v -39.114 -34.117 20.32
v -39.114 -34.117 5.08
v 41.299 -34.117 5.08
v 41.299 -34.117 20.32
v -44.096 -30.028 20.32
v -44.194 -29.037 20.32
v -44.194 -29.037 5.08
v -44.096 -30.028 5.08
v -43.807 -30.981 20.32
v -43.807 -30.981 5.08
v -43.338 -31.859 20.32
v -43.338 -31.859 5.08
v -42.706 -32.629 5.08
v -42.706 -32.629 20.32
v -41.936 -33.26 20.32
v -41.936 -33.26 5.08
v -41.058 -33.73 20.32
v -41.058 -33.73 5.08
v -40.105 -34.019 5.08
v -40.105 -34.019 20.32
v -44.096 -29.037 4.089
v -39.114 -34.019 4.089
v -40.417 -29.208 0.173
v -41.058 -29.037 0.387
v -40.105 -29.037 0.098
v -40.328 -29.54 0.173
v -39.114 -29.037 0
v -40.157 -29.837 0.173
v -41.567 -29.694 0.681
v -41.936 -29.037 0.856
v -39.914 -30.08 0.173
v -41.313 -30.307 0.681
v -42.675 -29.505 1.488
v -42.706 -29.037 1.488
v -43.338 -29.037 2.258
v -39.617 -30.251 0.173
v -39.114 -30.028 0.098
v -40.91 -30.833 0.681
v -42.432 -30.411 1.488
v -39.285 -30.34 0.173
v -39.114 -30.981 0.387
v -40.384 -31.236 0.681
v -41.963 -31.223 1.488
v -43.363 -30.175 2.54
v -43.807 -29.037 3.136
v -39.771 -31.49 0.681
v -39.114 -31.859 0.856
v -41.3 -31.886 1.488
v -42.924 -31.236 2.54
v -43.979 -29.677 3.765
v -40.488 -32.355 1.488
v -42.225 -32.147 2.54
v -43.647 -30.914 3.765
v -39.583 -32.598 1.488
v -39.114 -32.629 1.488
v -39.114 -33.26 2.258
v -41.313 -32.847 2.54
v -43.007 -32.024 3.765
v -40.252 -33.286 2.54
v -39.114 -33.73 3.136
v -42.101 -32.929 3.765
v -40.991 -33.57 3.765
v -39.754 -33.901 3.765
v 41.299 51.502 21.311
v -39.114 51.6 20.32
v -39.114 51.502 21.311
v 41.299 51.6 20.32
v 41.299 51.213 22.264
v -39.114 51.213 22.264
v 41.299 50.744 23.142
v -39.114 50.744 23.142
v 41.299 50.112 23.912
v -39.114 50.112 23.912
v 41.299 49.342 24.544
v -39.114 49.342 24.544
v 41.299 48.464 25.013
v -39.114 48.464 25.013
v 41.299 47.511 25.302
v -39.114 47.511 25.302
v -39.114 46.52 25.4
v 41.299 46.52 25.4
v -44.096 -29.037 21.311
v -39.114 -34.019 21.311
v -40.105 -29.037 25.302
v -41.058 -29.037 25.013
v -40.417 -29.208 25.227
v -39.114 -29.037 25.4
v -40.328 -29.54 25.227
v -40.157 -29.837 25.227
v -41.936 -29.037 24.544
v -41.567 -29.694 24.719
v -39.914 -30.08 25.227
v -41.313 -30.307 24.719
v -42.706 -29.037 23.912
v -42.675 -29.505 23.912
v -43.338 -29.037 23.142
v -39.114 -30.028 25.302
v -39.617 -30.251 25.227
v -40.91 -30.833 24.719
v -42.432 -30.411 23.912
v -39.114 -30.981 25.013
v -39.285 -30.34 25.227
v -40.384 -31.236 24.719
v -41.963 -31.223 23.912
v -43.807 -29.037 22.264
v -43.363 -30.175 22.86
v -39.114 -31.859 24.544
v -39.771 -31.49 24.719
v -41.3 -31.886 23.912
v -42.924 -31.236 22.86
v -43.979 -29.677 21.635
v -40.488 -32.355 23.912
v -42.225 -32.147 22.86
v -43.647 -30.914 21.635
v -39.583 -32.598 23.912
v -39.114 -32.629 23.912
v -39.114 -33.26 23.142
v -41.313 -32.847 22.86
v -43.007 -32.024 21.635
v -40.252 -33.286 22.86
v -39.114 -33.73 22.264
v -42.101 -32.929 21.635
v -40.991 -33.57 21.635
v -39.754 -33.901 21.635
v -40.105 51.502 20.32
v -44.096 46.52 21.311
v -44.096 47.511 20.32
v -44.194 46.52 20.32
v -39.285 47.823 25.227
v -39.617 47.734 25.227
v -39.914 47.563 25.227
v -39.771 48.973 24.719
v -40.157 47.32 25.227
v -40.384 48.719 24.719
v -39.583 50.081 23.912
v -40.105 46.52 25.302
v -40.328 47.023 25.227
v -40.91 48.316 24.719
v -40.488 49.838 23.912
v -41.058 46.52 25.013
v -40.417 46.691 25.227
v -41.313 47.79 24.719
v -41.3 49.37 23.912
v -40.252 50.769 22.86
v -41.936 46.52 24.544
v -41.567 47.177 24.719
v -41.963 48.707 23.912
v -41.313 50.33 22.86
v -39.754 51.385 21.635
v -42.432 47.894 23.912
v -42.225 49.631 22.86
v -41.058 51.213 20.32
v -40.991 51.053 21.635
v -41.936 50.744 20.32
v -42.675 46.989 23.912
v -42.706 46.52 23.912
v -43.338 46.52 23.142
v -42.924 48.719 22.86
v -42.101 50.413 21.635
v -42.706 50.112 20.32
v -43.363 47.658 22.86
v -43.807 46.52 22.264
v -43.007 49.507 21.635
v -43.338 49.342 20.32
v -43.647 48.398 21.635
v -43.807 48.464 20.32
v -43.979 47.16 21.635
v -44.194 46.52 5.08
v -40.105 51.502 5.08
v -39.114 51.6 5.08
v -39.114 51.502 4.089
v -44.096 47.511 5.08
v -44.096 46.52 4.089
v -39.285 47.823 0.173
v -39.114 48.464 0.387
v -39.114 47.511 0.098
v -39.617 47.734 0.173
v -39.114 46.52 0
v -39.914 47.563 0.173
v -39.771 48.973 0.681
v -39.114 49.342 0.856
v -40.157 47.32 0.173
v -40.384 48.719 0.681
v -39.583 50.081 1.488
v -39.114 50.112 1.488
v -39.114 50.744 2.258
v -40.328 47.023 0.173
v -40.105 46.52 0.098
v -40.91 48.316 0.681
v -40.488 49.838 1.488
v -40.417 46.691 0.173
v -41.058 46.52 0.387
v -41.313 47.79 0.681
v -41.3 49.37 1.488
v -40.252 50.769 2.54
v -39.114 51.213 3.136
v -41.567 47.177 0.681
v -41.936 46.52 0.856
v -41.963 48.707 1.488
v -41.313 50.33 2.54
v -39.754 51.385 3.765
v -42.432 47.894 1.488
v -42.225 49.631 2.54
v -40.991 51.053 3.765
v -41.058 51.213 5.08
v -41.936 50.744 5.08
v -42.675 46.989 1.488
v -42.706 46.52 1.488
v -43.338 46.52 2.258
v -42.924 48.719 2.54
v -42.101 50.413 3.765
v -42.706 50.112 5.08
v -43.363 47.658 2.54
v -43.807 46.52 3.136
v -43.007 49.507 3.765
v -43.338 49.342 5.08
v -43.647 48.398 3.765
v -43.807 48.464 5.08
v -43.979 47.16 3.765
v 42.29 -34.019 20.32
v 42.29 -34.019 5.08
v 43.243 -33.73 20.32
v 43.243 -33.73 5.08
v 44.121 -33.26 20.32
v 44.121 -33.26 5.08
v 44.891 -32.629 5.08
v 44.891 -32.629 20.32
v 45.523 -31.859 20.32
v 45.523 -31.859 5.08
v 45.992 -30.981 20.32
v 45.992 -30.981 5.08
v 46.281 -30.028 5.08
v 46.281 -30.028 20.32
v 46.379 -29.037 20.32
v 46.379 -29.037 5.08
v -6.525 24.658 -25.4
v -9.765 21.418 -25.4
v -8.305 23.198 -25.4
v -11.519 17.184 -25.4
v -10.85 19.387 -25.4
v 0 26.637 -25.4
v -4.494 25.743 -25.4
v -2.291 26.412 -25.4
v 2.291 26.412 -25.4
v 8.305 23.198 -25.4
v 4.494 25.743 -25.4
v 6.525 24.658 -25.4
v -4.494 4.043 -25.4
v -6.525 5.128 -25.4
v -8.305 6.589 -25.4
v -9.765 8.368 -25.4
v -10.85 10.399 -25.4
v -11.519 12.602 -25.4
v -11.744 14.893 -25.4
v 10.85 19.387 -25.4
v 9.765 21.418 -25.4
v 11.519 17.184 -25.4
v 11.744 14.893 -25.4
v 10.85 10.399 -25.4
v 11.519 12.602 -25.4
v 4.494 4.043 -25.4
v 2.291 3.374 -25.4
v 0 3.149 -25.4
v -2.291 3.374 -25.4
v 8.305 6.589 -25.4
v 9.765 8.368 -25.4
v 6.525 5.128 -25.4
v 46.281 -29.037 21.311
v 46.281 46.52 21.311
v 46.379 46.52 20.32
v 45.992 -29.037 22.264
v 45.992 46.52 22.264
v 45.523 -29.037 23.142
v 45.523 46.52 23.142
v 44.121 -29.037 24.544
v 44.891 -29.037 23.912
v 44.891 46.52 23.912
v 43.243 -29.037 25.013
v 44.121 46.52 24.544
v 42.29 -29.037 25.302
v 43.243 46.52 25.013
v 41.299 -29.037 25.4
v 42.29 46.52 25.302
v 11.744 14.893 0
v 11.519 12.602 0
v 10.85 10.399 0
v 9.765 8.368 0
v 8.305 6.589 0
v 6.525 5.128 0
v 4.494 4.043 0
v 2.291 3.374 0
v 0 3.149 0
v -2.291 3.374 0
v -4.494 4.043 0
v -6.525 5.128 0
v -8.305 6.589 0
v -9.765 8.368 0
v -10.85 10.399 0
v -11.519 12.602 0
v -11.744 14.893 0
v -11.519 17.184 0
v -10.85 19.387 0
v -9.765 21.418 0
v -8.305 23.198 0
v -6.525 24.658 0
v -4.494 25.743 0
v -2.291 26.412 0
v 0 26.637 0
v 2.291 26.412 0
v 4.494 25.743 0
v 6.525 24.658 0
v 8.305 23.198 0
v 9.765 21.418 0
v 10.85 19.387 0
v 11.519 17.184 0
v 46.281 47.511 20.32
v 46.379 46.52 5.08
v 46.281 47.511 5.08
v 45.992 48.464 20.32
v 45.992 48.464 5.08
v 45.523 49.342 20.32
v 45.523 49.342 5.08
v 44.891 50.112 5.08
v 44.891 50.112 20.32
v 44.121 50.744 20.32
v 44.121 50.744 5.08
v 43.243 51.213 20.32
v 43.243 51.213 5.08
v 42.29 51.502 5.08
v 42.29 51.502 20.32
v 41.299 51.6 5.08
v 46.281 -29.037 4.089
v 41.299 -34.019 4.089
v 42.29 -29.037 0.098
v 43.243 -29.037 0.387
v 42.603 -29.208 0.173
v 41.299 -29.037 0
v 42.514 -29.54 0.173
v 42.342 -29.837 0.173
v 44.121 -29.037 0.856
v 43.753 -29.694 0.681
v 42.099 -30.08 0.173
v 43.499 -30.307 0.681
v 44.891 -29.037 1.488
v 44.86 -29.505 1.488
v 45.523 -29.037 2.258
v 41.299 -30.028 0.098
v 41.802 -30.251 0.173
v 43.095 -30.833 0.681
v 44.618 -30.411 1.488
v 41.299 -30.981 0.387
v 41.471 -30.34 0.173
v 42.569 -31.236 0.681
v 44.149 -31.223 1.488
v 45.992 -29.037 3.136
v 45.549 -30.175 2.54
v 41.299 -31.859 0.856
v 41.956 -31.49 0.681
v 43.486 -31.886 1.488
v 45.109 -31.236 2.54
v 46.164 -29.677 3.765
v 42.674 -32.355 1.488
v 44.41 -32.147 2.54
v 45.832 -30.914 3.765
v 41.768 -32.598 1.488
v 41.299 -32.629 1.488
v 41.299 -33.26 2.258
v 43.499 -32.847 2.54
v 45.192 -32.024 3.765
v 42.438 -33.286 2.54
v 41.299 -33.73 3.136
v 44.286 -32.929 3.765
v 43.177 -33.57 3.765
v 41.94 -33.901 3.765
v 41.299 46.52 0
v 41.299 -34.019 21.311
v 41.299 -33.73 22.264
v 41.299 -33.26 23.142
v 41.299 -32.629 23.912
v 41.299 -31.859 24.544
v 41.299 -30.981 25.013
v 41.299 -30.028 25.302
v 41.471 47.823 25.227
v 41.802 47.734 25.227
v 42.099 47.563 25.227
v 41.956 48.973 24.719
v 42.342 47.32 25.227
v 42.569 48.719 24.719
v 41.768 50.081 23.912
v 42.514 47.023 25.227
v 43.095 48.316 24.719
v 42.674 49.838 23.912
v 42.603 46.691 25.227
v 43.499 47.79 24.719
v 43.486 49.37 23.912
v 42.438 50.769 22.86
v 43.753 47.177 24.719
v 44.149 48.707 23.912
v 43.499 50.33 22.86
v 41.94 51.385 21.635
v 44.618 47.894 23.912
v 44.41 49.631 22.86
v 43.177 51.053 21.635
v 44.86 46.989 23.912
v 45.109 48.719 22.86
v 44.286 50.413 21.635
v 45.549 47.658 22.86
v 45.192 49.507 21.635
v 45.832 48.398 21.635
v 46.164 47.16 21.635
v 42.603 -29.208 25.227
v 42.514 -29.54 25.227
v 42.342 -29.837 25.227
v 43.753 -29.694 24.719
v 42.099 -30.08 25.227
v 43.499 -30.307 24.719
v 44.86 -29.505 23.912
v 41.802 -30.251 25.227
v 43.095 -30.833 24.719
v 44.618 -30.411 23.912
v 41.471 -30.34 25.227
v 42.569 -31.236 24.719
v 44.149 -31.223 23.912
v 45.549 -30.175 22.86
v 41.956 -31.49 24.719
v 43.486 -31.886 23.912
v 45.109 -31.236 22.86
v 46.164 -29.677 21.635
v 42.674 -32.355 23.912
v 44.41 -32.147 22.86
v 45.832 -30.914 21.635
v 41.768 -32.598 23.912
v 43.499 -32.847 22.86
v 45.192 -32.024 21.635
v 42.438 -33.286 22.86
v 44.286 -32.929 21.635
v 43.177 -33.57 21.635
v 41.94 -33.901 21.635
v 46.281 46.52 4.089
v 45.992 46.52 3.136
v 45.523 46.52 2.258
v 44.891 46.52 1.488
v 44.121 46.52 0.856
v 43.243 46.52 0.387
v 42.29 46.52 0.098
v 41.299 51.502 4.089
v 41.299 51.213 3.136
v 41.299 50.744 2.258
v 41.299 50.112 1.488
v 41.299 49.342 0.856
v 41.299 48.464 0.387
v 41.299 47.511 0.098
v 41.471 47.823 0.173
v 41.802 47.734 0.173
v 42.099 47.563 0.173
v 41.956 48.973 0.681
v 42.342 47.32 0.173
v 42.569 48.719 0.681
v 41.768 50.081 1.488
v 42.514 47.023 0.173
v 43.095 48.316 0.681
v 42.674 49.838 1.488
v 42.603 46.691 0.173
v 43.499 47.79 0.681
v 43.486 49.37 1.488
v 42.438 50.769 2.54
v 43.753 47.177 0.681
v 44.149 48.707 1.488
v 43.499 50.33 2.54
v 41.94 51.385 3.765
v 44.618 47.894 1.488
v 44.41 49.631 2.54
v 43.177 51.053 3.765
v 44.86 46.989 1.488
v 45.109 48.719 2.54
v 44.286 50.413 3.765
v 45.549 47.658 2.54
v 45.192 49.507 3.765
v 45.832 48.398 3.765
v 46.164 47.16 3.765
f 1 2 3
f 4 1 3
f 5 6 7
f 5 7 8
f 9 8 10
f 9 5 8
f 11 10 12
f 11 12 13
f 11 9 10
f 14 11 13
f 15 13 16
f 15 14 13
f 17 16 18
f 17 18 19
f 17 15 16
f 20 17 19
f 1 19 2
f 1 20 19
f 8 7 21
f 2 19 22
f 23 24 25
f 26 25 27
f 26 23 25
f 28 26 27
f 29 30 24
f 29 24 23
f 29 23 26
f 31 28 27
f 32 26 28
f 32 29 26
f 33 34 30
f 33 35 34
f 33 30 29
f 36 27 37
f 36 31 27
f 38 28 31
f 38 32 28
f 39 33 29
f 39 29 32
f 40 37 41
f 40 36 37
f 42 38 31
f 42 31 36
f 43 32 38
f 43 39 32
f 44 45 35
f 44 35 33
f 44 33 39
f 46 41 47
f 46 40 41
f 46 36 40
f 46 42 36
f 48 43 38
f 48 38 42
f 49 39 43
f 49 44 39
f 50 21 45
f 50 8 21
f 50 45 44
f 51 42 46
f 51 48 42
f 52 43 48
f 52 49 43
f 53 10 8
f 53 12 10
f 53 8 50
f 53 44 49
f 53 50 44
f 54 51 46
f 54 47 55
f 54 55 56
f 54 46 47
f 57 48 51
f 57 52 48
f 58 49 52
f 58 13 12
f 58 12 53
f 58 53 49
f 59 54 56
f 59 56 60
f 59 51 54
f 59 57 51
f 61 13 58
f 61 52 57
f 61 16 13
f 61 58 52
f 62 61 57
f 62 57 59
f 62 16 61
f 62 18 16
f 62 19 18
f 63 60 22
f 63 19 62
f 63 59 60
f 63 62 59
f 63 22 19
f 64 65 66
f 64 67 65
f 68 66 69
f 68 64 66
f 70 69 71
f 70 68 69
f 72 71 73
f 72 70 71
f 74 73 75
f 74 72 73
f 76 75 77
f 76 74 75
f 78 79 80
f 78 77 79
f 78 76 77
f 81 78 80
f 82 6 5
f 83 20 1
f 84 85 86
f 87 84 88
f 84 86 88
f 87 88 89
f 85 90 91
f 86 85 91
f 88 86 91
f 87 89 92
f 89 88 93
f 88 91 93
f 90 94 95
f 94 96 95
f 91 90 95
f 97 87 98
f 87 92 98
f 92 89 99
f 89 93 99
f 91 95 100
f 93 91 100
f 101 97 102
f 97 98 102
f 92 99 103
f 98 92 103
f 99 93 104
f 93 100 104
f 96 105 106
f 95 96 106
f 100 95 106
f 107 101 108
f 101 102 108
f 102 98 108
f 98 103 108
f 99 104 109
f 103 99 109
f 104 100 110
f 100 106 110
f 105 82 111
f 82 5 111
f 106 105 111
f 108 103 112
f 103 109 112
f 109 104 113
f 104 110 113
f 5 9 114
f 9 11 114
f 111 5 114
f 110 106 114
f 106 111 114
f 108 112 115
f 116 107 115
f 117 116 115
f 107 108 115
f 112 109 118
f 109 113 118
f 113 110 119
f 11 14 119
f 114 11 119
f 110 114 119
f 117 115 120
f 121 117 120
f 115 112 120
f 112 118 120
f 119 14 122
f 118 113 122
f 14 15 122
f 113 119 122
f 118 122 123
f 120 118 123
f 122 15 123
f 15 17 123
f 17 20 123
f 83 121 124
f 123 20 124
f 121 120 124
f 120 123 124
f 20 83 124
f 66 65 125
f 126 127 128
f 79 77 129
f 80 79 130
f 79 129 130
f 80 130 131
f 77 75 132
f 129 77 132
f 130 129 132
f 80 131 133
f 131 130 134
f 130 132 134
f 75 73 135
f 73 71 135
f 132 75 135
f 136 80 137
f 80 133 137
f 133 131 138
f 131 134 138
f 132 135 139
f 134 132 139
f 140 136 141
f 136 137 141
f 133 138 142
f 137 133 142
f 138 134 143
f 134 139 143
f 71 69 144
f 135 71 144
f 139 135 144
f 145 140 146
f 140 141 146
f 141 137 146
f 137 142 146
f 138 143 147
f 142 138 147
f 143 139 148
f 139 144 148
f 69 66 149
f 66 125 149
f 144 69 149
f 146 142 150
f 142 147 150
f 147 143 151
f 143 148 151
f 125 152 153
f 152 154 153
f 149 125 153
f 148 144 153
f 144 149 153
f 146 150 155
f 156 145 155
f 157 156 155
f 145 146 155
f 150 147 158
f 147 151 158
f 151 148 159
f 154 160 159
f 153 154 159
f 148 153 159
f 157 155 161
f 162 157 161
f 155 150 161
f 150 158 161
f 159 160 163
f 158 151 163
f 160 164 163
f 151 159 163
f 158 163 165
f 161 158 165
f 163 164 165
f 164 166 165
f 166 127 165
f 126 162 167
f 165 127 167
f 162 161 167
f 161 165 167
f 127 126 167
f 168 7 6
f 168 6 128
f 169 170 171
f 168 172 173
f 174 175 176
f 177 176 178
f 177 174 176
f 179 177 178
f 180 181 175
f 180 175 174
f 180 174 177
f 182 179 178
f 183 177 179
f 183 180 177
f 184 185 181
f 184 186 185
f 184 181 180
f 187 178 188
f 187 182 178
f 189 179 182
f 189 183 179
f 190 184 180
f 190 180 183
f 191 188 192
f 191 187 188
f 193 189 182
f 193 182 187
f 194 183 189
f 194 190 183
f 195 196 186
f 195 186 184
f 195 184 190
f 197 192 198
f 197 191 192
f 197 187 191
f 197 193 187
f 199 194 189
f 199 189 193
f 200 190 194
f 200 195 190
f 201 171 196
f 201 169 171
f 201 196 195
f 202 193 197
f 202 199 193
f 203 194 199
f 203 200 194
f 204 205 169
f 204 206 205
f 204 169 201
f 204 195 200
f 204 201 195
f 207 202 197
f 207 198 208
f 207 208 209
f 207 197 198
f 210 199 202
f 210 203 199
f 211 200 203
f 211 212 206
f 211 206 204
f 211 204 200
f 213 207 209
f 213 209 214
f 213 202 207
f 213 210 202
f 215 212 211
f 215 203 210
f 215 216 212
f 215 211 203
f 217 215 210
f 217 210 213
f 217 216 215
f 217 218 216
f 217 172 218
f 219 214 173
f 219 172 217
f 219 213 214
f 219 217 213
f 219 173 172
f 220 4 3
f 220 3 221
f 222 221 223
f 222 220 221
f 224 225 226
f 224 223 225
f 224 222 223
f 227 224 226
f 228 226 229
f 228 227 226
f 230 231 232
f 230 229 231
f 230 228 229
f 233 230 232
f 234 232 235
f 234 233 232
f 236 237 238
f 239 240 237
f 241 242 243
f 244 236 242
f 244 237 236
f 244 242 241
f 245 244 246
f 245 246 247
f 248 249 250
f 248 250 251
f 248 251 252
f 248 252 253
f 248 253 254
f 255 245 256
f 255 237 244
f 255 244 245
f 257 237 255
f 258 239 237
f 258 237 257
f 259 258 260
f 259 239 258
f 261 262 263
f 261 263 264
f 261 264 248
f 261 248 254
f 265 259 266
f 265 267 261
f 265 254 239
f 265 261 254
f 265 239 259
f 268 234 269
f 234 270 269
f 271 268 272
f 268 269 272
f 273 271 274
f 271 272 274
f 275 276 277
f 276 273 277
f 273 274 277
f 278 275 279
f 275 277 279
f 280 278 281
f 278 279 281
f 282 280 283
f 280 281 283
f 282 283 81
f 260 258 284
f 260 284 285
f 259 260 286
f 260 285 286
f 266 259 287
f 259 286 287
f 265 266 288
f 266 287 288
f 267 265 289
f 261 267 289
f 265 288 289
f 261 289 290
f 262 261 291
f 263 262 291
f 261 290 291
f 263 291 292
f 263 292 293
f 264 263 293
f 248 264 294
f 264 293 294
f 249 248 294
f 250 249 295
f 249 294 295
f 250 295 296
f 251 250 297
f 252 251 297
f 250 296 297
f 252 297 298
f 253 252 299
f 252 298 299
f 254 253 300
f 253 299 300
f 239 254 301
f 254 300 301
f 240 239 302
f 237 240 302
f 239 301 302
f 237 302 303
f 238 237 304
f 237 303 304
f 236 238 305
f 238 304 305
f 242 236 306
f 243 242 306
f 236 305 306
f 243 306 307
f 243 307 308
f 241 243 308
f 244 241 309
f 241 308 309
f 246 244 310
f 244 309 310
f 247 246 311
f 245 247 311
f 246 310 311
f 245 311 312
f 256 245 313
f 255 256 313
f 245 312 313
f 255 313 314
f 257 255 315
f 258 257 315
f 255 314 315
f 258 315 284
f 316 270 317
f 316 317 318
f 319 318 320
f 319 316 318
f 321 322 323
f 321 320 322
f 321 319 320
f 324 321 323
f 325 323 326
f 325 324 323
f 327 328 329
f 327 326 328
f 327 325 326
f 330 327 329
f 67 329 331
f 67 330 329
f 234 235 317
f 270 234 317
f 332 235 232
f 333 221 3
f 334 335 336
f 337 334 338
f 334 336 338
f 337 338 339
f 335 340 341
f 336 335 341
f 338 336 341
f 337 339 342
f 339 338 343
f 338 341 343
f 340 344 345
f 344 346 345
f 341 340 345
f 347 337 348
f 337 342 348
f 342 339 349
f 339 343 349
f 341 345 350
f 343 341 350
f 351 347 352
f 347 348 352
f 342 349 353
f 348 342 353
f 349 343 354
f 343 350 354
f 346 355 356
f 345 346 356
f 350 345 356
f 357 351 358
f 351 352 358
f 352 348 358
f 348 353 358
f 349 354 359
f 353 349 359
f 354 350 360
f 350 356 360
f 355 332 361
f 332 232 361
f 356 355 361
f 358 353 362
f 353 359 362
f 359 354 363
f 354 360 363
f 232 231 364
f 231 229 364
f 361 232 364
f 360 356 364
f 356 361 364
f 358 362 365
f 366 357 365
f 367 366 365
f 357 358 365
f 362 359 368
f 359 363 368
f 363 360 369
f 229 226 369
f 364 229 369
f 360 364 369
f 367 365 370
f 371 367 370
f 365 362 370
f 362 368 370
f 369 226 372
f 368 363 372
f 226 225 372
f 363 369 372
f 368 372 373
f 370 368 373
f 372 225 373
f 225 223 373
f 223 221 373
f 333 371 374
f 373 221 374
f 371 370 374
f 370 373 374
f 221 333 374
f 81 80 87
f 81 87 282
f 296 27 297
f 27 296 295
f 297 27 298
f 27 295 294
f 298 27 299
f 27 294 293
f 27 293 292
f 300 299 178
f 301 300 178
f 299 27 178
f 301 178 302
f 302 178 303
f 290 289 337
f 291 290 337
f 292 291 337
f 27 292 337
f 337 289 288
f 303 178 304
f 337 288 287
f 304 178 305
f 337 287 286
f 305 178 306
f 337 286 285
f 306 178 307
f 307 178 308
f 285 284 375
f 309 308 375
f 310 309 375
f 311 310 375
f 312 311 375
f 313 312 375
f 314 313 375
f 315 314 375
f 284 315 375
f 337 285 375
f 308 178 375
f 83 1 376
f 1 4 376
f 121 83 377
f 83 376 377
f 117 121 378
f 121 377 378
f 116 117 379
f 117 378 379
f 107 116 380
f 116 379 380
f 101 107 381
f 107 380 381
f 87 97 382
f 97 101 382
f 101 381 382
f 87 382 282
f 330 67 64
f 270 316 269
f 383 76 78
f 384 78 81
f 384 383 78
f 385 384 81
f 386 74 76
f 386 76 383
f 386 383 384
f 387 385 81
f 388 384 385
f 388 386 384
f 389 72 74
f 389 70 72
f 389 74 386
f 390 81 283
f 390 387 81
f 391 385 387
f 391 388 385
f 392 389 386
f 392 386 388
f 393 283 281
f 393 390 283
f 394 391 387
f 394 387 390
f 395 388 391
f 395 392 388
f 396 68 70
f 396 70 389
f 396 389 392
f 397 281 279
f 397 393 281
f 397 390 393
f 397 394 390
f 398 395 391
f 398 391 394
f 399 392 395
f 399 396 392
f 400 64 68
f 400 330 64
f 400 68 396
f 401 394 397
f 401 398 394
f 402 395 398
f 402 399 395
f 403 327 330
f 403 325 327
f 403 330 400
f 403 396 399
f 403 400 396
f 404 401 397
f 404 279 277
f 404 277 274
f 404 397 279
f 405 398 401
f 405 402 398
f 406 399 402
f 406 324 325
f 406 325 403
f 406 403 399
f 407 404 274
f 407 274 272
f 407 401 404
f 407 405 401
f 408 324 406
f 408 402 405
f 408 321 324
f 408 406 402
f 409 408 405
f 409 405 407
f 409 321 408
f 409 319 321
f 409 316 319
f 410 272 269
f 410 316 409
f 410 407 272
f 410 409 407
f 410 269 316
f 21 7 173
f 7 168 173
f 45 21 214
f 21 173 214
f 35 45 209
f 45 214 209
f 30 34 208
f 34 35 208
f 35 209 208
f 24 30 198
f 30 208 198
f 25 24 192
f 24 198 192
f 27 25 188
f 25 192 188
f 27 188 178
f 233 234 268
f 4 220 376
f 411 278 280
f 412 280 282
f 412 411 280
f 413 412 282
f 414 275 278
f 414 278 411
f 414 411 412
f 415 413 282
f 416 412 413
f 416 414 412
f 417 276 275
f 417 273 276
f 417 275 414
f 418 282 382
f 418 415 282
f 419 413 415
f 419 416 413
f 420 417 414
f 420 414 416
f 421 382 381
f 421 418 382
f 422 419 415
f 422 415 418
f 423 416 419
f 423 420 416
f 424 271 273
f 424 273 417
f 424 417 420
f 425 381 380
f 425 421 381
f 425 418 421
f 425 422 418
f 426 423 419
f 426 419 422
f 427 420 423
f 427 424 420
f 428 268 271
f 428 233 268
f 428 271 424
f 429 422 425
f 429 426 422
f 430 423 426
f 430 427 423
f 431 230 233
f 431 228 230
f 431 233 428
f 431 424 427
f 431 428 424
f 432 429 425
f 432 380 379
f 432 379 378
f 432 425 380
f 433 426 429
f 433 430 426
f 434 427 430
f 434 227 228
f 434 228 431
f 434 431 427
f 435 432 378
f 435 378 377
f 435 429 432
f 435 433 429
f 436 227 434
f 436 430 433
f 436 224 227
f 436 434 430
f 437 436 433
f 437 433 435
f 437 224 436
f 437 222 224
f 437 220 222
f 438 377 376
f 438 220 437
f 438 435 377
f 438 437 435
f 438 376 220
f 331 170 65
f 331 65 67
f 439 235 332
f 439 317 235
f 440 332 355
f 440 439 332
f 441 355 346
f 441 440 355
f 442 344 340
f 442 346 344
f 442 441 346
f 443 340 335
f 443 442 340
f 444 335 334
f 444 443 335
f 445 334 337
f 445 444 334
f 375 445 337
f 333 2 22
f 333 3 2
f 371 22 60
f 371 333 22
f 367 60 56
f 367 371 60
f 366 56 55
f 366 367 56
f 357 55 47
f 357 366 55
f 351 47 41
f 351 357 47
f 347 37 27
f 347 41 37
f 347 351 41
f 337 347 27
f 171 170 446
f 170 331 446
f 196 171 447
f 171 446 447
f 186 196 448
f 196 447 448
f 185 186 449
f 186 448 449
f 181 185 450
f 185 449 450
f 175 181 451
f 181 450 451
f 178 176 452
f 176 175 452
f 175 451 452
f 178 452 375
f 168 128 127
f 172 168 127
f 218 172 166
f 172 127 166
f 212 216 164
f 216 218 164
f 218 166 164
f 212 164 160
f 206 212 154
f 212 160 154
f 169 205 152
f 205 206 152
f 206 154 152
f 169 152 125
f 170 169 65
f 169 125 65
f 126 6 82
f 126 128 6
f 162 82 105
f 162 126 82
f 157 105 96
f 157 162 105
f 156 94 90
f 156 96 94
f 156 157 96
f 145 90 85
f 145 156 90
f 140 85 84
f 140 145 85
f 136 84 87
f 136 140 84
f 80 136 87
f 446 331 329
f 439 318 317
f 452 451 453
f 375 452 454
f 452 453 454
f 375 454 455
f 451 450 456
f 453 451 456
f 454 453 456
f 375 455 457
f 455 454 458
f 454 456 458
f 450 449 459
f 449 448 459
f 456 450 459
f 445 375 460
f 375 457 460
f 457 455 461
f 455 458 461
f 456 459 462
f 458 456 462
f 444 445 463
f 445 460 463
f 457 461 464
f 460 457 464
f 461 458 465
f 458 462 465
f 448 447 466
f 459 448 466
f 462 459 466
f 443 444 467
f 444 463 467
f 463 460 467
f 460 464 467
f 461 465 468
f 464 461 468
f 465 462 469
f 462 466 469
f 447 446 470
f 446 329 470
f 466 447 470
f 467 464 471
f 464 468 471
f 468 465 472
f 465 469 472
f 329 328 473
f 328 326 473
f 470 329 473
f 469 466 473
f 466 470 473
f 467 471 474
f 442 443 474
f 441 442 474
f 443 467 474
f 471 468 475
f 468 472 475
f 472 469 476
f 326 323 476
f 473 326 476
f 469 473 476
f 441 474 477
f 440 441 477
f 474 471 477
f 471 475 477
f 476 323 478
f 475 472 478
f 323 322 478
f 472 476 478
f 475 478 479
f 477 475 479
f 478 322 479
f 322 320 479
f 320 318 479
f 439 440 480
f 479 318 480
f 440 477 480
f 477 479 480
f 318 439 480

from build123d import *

# Parameters (mm, degrees)
F0_W     = 90.572778
F0_H     = 85.716326
F1_DEPTH = 25.4
F2_R     = 5.08
F3_R     = 11.744353
F4_DEPTH = 25.4


with BuildPart() as f1:
    # F0 (on Top) → F1 (new body)
    with BuildSketch(Plane.XY):
        with Locations((1.0927, 8.741608)):
            Rectangle(F0_W, F0_H)
    extrude(amount=F1_DEPTH)

    # F2
    f2_edges = [f1.edges().sort_by_distance(p)[0] for p in [
        (46.379089, 51.599771, 12.7),
        (-44.193689, 51.599771, 12.7),
        (1.0927, 51.599771, 0),
        (1.0927, 51.599771, 25.4),
        (46.379089, -34.116555, 12.7),
        (46.379089, 8.741608, 0),
        (46.379089, 8.741608, 25.4),
        (-44.193689, -34.116555, 12.7),
        (-44.193689, 8.741608, 0),
        (-44.193689, 8.741608, 25.4),
        (1.0927, -34.116555, 0),
        (1.0927, -34.116555, 25.4),
    ]]
    fillet(f2_edges, radius=F2_R)

    # F3 (on face) → F4 (join)
    with BuildSketch(Plane(origin=(0, 0, 0), x_dir=(1, 0, 0), z_dir=(0, 0, -1))):
        with Locations((0, -14.89311)):
            Circle(F3_R)
    extrude(amount=F4_DEPTH)


solid = f1.part
